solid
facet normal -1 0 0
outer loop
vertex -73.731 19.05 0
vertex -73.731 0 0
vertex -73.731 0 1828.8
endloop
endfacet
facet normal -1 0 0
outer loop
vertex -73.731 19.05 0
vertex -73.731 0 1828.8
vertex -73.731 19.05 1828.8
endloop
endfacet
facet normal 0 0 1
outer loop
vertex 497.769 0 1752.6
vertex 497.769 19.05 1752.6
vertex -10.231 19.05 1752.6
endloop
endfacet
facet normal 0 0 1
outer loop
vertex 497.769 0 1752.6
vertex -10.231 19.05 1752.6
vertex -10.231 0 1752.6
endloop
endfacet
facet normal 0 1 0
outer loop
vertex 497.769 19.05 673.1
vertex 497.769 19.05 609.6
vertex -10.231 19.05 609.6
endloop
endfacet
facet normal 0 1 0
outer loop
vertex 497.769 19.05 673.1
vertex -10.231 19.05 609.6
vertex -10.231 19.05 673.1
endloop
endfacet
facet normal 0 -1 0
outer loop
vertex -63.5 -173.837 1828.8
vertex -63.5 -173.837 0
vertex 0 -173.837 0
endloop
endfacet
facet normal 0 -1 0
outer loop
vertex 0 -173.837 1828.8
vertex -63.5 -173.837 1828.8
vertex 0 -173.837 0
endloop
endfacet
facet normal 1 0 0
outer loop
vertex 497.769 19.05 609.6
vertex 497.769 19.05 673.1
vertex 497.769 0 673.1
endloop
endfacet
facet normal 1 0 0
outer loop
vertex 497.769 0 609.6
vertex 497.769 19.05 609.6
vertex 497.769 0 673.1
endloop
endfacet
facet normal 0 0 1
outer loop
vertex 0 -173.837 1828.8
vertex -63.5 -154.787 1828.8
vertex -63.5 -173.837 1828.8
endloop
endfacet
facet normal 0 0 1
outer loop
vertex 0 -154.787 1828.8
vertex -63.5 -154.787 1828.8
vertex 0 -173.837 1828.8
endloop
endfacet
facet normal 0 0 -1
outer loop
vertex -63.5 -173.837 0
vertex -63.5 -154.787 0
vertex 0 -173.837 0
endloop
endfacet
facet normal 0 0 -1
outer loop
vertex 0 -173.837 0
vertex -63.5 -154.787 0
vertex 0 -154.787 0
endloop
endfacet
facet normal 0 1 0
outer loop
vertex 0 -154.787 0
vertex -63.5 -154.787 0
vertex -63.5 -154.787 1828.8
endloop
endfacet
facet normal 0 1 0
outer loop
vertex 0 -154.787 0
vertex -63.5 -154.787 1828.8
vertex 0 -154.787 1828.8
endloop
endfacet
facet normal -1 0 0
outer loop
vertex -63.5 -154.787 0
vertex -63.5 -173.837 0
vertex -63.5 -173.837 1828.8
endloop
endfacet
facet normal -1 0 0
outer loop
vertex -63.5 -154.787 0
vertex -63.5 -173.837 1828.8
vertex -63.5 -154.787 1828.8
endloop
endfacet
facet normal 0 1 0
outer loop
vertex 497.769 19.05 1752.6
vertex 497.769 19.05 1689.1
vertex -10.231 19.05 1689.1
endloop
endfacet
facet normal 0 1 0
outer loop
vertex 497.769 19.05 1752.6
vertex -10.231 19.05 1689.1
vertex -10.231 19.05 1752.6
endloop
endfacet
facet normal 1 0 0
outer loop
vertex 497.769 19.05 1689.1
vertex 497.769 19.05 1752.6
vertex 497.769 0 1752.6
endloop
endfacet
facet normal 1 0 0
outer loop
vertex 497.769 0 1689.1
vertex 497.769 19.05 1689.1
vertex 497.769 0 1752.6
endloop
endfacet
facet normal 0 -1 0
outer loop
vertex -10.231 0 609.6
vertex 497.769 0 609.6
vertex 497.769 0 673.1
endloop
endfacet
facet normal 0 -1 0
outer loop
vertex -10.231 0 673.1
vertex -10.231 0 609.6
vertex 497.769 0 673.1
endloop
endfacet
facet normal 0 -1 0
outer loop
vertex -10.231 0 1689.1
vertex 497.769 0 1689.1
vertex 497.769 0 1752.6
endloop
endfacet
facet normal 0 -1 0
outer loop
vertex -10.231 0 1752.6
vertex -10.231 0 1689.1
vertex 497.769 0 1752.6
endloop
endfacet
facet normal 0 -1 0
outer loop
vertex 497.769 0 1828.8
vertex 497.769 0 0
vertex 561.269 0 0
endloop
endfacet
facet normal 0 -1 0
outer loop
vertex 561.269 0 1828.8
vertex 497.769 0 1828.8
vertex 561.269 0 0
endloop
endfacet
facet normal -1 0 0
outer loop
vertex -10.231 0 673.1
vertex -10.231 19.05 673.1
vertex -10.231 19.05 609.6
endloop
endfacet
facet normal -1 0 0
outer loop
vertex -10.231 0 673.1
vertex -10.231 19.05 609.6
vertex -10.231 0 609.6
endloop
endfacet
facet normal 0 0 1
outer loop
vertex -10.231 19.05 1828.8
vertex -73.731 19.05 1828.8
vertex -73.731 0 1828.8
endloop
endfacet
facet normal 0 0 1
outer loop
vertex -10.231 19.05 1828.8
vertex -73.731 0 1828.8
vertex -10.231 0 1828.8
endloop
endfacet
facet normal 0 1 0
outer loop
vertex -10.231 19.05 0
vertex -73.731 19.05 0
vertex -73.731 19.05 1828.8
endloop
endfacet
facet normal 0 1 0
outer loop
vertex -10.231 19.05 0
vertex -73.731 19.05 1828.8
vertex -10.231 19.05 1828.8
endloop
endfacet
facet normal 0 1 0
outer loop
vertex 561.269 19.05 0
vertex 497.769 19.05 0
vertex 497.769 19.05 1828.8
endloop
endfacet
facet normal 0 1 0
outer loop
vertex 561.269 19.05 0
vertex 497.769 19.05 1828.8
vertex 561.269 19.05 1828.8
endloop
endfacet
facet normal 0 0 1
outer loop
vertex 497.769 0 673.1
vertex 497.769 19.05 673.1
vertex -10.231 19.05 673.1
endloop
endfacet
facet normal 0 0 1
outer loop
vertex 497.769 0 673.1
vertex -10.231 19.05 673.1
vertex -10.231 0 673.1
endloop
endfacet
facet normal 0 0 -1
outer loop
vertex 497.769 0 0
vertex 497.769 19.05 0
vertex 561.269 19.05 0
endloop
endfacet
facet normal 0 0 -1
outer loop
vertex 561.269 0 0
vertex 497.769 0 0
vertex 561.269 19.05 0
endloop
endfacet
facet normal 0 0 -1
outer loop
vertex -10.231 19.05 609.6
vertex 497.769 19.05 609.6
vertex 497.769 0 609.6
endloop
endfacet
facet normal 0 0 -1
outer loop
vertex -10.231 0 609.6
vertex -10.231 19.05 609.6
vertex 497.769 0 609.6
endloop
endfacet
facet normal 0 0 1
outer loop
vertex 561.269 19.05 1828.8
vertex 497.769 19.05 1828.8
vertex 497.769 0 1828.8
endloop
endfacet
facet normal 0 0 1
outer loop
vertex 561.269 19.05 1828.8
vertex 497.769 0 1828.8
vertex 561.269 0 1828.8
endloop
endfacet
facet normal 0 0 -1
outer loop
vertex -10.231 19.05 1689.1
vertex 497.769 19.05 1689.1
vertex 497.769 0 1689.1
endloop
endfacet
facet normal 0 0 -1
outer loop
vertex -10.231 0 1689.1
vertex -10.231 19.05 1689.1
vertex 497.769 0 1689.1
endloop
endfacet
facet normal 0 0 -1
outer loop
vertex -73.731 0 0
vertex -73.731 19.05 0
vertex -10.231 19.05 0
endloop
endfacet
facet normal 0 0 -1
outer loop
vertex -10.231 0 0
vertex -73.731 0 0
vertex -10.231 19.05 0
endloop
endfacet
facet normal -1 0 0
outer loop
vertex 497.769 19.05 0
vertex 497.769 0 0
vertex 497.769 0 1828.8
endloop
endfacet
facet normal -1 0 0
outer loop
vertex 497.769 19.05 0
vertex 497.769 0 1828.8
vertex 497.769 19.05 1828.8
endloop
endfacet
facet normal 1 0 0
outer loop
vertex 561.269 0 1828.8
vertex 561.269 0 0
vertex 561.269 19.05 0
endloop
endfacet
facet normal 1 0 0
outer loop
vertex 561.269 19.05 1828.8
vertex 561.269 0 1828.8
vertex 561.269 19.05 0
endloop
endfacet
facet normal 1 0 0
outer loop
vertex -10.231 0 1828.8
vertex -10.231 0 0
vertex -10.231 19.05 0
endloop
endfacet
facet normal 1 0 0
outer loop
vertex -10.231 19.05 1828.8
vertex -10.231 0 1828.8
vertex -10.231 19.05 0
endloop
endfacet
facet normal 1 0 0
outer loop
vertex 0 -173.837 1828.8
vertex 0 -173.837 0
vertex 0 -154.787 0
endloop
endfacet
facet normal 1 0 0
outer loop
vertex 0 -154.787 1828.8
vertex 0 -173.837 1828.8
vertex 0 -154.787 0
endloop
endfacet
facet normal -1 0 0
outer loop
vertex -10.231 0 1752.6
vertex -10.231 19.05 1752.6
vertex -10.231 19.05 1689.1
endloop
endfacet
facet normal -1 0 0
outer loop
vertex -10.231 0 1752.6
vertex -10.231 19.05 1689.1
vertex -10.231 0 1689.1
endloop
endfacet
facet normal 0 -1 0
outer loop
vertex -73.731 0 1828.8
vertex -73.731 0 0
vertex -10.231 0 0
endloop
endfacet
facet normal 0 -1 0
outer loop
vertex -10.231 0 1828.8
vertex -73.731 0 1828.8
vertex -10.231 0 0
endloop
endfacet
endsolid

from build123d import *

# Parameters (mm, degrees)
F0_W     = 63.5
F0_H     = 19.05
F1_DEPTH = 1828.8
F2_DEPTH = 1828.8
F3_W     = 19.05
F3_H     = 63.5
F4_DEPTH = 508
F5_DEPTH = 508
F6_DEPTH = 1828.8


with BuildPart() as f1:
    # F0 (on Top) → F1 (new body)
    with BuildSketch(Plane.XY):
        with Locations((-41.980549, 9.525)):
            Rectangle(F0_W, F0_H)
    extrude(amount=F1_DEPTH)


with BuildPart() as f2:
    # F0 (on Top) → F2 (new body)
    with BuildSketch(Plane.XY):
        with Locations((529.519451, 9.525)):
            Rectangle(F0_W, F0_H)
    extrude(amount=F2_DEPTH)


with BuildPart() as f4:
    # F3 (on face) → F4 (new body, through all)
    with BuildSketch(Plane(origin=(497.769451, 0, 0), x_dir=(0, -1, 0), z_dir=(-1, 0, 0))):
        with Locations((-9.525, 1720.85)):
            Rectangle(F3_W, F3_H)
    extrude(amount=F4_DEPTH)


with BuildPart() as f5:
    # F3 (on face) → F5 (new body, through all)
    with BuildSketch(Plane(origin=(497.769451, 0, 0), x_dir=(0, -1, 0), z_dir=(-1, 0, 0))):
        with Locations((-9.525, 641.35)):
            Rectangle(F3_W, F3_H)
    extrude(amount=F5_DEPTH)


with BuildPart() as f6:
    # F0 (on Top) → F6 (new body)
    with BuildSketch(Plane.XY):
        with Locations((-31.75, -164.3119)):
            Rectangle(F0_W, F0_H)
    extrude(amount=F6_DEPTH)


solid = Compound([f1.part, f2.part, f4.part, f5.part, f6.part])
